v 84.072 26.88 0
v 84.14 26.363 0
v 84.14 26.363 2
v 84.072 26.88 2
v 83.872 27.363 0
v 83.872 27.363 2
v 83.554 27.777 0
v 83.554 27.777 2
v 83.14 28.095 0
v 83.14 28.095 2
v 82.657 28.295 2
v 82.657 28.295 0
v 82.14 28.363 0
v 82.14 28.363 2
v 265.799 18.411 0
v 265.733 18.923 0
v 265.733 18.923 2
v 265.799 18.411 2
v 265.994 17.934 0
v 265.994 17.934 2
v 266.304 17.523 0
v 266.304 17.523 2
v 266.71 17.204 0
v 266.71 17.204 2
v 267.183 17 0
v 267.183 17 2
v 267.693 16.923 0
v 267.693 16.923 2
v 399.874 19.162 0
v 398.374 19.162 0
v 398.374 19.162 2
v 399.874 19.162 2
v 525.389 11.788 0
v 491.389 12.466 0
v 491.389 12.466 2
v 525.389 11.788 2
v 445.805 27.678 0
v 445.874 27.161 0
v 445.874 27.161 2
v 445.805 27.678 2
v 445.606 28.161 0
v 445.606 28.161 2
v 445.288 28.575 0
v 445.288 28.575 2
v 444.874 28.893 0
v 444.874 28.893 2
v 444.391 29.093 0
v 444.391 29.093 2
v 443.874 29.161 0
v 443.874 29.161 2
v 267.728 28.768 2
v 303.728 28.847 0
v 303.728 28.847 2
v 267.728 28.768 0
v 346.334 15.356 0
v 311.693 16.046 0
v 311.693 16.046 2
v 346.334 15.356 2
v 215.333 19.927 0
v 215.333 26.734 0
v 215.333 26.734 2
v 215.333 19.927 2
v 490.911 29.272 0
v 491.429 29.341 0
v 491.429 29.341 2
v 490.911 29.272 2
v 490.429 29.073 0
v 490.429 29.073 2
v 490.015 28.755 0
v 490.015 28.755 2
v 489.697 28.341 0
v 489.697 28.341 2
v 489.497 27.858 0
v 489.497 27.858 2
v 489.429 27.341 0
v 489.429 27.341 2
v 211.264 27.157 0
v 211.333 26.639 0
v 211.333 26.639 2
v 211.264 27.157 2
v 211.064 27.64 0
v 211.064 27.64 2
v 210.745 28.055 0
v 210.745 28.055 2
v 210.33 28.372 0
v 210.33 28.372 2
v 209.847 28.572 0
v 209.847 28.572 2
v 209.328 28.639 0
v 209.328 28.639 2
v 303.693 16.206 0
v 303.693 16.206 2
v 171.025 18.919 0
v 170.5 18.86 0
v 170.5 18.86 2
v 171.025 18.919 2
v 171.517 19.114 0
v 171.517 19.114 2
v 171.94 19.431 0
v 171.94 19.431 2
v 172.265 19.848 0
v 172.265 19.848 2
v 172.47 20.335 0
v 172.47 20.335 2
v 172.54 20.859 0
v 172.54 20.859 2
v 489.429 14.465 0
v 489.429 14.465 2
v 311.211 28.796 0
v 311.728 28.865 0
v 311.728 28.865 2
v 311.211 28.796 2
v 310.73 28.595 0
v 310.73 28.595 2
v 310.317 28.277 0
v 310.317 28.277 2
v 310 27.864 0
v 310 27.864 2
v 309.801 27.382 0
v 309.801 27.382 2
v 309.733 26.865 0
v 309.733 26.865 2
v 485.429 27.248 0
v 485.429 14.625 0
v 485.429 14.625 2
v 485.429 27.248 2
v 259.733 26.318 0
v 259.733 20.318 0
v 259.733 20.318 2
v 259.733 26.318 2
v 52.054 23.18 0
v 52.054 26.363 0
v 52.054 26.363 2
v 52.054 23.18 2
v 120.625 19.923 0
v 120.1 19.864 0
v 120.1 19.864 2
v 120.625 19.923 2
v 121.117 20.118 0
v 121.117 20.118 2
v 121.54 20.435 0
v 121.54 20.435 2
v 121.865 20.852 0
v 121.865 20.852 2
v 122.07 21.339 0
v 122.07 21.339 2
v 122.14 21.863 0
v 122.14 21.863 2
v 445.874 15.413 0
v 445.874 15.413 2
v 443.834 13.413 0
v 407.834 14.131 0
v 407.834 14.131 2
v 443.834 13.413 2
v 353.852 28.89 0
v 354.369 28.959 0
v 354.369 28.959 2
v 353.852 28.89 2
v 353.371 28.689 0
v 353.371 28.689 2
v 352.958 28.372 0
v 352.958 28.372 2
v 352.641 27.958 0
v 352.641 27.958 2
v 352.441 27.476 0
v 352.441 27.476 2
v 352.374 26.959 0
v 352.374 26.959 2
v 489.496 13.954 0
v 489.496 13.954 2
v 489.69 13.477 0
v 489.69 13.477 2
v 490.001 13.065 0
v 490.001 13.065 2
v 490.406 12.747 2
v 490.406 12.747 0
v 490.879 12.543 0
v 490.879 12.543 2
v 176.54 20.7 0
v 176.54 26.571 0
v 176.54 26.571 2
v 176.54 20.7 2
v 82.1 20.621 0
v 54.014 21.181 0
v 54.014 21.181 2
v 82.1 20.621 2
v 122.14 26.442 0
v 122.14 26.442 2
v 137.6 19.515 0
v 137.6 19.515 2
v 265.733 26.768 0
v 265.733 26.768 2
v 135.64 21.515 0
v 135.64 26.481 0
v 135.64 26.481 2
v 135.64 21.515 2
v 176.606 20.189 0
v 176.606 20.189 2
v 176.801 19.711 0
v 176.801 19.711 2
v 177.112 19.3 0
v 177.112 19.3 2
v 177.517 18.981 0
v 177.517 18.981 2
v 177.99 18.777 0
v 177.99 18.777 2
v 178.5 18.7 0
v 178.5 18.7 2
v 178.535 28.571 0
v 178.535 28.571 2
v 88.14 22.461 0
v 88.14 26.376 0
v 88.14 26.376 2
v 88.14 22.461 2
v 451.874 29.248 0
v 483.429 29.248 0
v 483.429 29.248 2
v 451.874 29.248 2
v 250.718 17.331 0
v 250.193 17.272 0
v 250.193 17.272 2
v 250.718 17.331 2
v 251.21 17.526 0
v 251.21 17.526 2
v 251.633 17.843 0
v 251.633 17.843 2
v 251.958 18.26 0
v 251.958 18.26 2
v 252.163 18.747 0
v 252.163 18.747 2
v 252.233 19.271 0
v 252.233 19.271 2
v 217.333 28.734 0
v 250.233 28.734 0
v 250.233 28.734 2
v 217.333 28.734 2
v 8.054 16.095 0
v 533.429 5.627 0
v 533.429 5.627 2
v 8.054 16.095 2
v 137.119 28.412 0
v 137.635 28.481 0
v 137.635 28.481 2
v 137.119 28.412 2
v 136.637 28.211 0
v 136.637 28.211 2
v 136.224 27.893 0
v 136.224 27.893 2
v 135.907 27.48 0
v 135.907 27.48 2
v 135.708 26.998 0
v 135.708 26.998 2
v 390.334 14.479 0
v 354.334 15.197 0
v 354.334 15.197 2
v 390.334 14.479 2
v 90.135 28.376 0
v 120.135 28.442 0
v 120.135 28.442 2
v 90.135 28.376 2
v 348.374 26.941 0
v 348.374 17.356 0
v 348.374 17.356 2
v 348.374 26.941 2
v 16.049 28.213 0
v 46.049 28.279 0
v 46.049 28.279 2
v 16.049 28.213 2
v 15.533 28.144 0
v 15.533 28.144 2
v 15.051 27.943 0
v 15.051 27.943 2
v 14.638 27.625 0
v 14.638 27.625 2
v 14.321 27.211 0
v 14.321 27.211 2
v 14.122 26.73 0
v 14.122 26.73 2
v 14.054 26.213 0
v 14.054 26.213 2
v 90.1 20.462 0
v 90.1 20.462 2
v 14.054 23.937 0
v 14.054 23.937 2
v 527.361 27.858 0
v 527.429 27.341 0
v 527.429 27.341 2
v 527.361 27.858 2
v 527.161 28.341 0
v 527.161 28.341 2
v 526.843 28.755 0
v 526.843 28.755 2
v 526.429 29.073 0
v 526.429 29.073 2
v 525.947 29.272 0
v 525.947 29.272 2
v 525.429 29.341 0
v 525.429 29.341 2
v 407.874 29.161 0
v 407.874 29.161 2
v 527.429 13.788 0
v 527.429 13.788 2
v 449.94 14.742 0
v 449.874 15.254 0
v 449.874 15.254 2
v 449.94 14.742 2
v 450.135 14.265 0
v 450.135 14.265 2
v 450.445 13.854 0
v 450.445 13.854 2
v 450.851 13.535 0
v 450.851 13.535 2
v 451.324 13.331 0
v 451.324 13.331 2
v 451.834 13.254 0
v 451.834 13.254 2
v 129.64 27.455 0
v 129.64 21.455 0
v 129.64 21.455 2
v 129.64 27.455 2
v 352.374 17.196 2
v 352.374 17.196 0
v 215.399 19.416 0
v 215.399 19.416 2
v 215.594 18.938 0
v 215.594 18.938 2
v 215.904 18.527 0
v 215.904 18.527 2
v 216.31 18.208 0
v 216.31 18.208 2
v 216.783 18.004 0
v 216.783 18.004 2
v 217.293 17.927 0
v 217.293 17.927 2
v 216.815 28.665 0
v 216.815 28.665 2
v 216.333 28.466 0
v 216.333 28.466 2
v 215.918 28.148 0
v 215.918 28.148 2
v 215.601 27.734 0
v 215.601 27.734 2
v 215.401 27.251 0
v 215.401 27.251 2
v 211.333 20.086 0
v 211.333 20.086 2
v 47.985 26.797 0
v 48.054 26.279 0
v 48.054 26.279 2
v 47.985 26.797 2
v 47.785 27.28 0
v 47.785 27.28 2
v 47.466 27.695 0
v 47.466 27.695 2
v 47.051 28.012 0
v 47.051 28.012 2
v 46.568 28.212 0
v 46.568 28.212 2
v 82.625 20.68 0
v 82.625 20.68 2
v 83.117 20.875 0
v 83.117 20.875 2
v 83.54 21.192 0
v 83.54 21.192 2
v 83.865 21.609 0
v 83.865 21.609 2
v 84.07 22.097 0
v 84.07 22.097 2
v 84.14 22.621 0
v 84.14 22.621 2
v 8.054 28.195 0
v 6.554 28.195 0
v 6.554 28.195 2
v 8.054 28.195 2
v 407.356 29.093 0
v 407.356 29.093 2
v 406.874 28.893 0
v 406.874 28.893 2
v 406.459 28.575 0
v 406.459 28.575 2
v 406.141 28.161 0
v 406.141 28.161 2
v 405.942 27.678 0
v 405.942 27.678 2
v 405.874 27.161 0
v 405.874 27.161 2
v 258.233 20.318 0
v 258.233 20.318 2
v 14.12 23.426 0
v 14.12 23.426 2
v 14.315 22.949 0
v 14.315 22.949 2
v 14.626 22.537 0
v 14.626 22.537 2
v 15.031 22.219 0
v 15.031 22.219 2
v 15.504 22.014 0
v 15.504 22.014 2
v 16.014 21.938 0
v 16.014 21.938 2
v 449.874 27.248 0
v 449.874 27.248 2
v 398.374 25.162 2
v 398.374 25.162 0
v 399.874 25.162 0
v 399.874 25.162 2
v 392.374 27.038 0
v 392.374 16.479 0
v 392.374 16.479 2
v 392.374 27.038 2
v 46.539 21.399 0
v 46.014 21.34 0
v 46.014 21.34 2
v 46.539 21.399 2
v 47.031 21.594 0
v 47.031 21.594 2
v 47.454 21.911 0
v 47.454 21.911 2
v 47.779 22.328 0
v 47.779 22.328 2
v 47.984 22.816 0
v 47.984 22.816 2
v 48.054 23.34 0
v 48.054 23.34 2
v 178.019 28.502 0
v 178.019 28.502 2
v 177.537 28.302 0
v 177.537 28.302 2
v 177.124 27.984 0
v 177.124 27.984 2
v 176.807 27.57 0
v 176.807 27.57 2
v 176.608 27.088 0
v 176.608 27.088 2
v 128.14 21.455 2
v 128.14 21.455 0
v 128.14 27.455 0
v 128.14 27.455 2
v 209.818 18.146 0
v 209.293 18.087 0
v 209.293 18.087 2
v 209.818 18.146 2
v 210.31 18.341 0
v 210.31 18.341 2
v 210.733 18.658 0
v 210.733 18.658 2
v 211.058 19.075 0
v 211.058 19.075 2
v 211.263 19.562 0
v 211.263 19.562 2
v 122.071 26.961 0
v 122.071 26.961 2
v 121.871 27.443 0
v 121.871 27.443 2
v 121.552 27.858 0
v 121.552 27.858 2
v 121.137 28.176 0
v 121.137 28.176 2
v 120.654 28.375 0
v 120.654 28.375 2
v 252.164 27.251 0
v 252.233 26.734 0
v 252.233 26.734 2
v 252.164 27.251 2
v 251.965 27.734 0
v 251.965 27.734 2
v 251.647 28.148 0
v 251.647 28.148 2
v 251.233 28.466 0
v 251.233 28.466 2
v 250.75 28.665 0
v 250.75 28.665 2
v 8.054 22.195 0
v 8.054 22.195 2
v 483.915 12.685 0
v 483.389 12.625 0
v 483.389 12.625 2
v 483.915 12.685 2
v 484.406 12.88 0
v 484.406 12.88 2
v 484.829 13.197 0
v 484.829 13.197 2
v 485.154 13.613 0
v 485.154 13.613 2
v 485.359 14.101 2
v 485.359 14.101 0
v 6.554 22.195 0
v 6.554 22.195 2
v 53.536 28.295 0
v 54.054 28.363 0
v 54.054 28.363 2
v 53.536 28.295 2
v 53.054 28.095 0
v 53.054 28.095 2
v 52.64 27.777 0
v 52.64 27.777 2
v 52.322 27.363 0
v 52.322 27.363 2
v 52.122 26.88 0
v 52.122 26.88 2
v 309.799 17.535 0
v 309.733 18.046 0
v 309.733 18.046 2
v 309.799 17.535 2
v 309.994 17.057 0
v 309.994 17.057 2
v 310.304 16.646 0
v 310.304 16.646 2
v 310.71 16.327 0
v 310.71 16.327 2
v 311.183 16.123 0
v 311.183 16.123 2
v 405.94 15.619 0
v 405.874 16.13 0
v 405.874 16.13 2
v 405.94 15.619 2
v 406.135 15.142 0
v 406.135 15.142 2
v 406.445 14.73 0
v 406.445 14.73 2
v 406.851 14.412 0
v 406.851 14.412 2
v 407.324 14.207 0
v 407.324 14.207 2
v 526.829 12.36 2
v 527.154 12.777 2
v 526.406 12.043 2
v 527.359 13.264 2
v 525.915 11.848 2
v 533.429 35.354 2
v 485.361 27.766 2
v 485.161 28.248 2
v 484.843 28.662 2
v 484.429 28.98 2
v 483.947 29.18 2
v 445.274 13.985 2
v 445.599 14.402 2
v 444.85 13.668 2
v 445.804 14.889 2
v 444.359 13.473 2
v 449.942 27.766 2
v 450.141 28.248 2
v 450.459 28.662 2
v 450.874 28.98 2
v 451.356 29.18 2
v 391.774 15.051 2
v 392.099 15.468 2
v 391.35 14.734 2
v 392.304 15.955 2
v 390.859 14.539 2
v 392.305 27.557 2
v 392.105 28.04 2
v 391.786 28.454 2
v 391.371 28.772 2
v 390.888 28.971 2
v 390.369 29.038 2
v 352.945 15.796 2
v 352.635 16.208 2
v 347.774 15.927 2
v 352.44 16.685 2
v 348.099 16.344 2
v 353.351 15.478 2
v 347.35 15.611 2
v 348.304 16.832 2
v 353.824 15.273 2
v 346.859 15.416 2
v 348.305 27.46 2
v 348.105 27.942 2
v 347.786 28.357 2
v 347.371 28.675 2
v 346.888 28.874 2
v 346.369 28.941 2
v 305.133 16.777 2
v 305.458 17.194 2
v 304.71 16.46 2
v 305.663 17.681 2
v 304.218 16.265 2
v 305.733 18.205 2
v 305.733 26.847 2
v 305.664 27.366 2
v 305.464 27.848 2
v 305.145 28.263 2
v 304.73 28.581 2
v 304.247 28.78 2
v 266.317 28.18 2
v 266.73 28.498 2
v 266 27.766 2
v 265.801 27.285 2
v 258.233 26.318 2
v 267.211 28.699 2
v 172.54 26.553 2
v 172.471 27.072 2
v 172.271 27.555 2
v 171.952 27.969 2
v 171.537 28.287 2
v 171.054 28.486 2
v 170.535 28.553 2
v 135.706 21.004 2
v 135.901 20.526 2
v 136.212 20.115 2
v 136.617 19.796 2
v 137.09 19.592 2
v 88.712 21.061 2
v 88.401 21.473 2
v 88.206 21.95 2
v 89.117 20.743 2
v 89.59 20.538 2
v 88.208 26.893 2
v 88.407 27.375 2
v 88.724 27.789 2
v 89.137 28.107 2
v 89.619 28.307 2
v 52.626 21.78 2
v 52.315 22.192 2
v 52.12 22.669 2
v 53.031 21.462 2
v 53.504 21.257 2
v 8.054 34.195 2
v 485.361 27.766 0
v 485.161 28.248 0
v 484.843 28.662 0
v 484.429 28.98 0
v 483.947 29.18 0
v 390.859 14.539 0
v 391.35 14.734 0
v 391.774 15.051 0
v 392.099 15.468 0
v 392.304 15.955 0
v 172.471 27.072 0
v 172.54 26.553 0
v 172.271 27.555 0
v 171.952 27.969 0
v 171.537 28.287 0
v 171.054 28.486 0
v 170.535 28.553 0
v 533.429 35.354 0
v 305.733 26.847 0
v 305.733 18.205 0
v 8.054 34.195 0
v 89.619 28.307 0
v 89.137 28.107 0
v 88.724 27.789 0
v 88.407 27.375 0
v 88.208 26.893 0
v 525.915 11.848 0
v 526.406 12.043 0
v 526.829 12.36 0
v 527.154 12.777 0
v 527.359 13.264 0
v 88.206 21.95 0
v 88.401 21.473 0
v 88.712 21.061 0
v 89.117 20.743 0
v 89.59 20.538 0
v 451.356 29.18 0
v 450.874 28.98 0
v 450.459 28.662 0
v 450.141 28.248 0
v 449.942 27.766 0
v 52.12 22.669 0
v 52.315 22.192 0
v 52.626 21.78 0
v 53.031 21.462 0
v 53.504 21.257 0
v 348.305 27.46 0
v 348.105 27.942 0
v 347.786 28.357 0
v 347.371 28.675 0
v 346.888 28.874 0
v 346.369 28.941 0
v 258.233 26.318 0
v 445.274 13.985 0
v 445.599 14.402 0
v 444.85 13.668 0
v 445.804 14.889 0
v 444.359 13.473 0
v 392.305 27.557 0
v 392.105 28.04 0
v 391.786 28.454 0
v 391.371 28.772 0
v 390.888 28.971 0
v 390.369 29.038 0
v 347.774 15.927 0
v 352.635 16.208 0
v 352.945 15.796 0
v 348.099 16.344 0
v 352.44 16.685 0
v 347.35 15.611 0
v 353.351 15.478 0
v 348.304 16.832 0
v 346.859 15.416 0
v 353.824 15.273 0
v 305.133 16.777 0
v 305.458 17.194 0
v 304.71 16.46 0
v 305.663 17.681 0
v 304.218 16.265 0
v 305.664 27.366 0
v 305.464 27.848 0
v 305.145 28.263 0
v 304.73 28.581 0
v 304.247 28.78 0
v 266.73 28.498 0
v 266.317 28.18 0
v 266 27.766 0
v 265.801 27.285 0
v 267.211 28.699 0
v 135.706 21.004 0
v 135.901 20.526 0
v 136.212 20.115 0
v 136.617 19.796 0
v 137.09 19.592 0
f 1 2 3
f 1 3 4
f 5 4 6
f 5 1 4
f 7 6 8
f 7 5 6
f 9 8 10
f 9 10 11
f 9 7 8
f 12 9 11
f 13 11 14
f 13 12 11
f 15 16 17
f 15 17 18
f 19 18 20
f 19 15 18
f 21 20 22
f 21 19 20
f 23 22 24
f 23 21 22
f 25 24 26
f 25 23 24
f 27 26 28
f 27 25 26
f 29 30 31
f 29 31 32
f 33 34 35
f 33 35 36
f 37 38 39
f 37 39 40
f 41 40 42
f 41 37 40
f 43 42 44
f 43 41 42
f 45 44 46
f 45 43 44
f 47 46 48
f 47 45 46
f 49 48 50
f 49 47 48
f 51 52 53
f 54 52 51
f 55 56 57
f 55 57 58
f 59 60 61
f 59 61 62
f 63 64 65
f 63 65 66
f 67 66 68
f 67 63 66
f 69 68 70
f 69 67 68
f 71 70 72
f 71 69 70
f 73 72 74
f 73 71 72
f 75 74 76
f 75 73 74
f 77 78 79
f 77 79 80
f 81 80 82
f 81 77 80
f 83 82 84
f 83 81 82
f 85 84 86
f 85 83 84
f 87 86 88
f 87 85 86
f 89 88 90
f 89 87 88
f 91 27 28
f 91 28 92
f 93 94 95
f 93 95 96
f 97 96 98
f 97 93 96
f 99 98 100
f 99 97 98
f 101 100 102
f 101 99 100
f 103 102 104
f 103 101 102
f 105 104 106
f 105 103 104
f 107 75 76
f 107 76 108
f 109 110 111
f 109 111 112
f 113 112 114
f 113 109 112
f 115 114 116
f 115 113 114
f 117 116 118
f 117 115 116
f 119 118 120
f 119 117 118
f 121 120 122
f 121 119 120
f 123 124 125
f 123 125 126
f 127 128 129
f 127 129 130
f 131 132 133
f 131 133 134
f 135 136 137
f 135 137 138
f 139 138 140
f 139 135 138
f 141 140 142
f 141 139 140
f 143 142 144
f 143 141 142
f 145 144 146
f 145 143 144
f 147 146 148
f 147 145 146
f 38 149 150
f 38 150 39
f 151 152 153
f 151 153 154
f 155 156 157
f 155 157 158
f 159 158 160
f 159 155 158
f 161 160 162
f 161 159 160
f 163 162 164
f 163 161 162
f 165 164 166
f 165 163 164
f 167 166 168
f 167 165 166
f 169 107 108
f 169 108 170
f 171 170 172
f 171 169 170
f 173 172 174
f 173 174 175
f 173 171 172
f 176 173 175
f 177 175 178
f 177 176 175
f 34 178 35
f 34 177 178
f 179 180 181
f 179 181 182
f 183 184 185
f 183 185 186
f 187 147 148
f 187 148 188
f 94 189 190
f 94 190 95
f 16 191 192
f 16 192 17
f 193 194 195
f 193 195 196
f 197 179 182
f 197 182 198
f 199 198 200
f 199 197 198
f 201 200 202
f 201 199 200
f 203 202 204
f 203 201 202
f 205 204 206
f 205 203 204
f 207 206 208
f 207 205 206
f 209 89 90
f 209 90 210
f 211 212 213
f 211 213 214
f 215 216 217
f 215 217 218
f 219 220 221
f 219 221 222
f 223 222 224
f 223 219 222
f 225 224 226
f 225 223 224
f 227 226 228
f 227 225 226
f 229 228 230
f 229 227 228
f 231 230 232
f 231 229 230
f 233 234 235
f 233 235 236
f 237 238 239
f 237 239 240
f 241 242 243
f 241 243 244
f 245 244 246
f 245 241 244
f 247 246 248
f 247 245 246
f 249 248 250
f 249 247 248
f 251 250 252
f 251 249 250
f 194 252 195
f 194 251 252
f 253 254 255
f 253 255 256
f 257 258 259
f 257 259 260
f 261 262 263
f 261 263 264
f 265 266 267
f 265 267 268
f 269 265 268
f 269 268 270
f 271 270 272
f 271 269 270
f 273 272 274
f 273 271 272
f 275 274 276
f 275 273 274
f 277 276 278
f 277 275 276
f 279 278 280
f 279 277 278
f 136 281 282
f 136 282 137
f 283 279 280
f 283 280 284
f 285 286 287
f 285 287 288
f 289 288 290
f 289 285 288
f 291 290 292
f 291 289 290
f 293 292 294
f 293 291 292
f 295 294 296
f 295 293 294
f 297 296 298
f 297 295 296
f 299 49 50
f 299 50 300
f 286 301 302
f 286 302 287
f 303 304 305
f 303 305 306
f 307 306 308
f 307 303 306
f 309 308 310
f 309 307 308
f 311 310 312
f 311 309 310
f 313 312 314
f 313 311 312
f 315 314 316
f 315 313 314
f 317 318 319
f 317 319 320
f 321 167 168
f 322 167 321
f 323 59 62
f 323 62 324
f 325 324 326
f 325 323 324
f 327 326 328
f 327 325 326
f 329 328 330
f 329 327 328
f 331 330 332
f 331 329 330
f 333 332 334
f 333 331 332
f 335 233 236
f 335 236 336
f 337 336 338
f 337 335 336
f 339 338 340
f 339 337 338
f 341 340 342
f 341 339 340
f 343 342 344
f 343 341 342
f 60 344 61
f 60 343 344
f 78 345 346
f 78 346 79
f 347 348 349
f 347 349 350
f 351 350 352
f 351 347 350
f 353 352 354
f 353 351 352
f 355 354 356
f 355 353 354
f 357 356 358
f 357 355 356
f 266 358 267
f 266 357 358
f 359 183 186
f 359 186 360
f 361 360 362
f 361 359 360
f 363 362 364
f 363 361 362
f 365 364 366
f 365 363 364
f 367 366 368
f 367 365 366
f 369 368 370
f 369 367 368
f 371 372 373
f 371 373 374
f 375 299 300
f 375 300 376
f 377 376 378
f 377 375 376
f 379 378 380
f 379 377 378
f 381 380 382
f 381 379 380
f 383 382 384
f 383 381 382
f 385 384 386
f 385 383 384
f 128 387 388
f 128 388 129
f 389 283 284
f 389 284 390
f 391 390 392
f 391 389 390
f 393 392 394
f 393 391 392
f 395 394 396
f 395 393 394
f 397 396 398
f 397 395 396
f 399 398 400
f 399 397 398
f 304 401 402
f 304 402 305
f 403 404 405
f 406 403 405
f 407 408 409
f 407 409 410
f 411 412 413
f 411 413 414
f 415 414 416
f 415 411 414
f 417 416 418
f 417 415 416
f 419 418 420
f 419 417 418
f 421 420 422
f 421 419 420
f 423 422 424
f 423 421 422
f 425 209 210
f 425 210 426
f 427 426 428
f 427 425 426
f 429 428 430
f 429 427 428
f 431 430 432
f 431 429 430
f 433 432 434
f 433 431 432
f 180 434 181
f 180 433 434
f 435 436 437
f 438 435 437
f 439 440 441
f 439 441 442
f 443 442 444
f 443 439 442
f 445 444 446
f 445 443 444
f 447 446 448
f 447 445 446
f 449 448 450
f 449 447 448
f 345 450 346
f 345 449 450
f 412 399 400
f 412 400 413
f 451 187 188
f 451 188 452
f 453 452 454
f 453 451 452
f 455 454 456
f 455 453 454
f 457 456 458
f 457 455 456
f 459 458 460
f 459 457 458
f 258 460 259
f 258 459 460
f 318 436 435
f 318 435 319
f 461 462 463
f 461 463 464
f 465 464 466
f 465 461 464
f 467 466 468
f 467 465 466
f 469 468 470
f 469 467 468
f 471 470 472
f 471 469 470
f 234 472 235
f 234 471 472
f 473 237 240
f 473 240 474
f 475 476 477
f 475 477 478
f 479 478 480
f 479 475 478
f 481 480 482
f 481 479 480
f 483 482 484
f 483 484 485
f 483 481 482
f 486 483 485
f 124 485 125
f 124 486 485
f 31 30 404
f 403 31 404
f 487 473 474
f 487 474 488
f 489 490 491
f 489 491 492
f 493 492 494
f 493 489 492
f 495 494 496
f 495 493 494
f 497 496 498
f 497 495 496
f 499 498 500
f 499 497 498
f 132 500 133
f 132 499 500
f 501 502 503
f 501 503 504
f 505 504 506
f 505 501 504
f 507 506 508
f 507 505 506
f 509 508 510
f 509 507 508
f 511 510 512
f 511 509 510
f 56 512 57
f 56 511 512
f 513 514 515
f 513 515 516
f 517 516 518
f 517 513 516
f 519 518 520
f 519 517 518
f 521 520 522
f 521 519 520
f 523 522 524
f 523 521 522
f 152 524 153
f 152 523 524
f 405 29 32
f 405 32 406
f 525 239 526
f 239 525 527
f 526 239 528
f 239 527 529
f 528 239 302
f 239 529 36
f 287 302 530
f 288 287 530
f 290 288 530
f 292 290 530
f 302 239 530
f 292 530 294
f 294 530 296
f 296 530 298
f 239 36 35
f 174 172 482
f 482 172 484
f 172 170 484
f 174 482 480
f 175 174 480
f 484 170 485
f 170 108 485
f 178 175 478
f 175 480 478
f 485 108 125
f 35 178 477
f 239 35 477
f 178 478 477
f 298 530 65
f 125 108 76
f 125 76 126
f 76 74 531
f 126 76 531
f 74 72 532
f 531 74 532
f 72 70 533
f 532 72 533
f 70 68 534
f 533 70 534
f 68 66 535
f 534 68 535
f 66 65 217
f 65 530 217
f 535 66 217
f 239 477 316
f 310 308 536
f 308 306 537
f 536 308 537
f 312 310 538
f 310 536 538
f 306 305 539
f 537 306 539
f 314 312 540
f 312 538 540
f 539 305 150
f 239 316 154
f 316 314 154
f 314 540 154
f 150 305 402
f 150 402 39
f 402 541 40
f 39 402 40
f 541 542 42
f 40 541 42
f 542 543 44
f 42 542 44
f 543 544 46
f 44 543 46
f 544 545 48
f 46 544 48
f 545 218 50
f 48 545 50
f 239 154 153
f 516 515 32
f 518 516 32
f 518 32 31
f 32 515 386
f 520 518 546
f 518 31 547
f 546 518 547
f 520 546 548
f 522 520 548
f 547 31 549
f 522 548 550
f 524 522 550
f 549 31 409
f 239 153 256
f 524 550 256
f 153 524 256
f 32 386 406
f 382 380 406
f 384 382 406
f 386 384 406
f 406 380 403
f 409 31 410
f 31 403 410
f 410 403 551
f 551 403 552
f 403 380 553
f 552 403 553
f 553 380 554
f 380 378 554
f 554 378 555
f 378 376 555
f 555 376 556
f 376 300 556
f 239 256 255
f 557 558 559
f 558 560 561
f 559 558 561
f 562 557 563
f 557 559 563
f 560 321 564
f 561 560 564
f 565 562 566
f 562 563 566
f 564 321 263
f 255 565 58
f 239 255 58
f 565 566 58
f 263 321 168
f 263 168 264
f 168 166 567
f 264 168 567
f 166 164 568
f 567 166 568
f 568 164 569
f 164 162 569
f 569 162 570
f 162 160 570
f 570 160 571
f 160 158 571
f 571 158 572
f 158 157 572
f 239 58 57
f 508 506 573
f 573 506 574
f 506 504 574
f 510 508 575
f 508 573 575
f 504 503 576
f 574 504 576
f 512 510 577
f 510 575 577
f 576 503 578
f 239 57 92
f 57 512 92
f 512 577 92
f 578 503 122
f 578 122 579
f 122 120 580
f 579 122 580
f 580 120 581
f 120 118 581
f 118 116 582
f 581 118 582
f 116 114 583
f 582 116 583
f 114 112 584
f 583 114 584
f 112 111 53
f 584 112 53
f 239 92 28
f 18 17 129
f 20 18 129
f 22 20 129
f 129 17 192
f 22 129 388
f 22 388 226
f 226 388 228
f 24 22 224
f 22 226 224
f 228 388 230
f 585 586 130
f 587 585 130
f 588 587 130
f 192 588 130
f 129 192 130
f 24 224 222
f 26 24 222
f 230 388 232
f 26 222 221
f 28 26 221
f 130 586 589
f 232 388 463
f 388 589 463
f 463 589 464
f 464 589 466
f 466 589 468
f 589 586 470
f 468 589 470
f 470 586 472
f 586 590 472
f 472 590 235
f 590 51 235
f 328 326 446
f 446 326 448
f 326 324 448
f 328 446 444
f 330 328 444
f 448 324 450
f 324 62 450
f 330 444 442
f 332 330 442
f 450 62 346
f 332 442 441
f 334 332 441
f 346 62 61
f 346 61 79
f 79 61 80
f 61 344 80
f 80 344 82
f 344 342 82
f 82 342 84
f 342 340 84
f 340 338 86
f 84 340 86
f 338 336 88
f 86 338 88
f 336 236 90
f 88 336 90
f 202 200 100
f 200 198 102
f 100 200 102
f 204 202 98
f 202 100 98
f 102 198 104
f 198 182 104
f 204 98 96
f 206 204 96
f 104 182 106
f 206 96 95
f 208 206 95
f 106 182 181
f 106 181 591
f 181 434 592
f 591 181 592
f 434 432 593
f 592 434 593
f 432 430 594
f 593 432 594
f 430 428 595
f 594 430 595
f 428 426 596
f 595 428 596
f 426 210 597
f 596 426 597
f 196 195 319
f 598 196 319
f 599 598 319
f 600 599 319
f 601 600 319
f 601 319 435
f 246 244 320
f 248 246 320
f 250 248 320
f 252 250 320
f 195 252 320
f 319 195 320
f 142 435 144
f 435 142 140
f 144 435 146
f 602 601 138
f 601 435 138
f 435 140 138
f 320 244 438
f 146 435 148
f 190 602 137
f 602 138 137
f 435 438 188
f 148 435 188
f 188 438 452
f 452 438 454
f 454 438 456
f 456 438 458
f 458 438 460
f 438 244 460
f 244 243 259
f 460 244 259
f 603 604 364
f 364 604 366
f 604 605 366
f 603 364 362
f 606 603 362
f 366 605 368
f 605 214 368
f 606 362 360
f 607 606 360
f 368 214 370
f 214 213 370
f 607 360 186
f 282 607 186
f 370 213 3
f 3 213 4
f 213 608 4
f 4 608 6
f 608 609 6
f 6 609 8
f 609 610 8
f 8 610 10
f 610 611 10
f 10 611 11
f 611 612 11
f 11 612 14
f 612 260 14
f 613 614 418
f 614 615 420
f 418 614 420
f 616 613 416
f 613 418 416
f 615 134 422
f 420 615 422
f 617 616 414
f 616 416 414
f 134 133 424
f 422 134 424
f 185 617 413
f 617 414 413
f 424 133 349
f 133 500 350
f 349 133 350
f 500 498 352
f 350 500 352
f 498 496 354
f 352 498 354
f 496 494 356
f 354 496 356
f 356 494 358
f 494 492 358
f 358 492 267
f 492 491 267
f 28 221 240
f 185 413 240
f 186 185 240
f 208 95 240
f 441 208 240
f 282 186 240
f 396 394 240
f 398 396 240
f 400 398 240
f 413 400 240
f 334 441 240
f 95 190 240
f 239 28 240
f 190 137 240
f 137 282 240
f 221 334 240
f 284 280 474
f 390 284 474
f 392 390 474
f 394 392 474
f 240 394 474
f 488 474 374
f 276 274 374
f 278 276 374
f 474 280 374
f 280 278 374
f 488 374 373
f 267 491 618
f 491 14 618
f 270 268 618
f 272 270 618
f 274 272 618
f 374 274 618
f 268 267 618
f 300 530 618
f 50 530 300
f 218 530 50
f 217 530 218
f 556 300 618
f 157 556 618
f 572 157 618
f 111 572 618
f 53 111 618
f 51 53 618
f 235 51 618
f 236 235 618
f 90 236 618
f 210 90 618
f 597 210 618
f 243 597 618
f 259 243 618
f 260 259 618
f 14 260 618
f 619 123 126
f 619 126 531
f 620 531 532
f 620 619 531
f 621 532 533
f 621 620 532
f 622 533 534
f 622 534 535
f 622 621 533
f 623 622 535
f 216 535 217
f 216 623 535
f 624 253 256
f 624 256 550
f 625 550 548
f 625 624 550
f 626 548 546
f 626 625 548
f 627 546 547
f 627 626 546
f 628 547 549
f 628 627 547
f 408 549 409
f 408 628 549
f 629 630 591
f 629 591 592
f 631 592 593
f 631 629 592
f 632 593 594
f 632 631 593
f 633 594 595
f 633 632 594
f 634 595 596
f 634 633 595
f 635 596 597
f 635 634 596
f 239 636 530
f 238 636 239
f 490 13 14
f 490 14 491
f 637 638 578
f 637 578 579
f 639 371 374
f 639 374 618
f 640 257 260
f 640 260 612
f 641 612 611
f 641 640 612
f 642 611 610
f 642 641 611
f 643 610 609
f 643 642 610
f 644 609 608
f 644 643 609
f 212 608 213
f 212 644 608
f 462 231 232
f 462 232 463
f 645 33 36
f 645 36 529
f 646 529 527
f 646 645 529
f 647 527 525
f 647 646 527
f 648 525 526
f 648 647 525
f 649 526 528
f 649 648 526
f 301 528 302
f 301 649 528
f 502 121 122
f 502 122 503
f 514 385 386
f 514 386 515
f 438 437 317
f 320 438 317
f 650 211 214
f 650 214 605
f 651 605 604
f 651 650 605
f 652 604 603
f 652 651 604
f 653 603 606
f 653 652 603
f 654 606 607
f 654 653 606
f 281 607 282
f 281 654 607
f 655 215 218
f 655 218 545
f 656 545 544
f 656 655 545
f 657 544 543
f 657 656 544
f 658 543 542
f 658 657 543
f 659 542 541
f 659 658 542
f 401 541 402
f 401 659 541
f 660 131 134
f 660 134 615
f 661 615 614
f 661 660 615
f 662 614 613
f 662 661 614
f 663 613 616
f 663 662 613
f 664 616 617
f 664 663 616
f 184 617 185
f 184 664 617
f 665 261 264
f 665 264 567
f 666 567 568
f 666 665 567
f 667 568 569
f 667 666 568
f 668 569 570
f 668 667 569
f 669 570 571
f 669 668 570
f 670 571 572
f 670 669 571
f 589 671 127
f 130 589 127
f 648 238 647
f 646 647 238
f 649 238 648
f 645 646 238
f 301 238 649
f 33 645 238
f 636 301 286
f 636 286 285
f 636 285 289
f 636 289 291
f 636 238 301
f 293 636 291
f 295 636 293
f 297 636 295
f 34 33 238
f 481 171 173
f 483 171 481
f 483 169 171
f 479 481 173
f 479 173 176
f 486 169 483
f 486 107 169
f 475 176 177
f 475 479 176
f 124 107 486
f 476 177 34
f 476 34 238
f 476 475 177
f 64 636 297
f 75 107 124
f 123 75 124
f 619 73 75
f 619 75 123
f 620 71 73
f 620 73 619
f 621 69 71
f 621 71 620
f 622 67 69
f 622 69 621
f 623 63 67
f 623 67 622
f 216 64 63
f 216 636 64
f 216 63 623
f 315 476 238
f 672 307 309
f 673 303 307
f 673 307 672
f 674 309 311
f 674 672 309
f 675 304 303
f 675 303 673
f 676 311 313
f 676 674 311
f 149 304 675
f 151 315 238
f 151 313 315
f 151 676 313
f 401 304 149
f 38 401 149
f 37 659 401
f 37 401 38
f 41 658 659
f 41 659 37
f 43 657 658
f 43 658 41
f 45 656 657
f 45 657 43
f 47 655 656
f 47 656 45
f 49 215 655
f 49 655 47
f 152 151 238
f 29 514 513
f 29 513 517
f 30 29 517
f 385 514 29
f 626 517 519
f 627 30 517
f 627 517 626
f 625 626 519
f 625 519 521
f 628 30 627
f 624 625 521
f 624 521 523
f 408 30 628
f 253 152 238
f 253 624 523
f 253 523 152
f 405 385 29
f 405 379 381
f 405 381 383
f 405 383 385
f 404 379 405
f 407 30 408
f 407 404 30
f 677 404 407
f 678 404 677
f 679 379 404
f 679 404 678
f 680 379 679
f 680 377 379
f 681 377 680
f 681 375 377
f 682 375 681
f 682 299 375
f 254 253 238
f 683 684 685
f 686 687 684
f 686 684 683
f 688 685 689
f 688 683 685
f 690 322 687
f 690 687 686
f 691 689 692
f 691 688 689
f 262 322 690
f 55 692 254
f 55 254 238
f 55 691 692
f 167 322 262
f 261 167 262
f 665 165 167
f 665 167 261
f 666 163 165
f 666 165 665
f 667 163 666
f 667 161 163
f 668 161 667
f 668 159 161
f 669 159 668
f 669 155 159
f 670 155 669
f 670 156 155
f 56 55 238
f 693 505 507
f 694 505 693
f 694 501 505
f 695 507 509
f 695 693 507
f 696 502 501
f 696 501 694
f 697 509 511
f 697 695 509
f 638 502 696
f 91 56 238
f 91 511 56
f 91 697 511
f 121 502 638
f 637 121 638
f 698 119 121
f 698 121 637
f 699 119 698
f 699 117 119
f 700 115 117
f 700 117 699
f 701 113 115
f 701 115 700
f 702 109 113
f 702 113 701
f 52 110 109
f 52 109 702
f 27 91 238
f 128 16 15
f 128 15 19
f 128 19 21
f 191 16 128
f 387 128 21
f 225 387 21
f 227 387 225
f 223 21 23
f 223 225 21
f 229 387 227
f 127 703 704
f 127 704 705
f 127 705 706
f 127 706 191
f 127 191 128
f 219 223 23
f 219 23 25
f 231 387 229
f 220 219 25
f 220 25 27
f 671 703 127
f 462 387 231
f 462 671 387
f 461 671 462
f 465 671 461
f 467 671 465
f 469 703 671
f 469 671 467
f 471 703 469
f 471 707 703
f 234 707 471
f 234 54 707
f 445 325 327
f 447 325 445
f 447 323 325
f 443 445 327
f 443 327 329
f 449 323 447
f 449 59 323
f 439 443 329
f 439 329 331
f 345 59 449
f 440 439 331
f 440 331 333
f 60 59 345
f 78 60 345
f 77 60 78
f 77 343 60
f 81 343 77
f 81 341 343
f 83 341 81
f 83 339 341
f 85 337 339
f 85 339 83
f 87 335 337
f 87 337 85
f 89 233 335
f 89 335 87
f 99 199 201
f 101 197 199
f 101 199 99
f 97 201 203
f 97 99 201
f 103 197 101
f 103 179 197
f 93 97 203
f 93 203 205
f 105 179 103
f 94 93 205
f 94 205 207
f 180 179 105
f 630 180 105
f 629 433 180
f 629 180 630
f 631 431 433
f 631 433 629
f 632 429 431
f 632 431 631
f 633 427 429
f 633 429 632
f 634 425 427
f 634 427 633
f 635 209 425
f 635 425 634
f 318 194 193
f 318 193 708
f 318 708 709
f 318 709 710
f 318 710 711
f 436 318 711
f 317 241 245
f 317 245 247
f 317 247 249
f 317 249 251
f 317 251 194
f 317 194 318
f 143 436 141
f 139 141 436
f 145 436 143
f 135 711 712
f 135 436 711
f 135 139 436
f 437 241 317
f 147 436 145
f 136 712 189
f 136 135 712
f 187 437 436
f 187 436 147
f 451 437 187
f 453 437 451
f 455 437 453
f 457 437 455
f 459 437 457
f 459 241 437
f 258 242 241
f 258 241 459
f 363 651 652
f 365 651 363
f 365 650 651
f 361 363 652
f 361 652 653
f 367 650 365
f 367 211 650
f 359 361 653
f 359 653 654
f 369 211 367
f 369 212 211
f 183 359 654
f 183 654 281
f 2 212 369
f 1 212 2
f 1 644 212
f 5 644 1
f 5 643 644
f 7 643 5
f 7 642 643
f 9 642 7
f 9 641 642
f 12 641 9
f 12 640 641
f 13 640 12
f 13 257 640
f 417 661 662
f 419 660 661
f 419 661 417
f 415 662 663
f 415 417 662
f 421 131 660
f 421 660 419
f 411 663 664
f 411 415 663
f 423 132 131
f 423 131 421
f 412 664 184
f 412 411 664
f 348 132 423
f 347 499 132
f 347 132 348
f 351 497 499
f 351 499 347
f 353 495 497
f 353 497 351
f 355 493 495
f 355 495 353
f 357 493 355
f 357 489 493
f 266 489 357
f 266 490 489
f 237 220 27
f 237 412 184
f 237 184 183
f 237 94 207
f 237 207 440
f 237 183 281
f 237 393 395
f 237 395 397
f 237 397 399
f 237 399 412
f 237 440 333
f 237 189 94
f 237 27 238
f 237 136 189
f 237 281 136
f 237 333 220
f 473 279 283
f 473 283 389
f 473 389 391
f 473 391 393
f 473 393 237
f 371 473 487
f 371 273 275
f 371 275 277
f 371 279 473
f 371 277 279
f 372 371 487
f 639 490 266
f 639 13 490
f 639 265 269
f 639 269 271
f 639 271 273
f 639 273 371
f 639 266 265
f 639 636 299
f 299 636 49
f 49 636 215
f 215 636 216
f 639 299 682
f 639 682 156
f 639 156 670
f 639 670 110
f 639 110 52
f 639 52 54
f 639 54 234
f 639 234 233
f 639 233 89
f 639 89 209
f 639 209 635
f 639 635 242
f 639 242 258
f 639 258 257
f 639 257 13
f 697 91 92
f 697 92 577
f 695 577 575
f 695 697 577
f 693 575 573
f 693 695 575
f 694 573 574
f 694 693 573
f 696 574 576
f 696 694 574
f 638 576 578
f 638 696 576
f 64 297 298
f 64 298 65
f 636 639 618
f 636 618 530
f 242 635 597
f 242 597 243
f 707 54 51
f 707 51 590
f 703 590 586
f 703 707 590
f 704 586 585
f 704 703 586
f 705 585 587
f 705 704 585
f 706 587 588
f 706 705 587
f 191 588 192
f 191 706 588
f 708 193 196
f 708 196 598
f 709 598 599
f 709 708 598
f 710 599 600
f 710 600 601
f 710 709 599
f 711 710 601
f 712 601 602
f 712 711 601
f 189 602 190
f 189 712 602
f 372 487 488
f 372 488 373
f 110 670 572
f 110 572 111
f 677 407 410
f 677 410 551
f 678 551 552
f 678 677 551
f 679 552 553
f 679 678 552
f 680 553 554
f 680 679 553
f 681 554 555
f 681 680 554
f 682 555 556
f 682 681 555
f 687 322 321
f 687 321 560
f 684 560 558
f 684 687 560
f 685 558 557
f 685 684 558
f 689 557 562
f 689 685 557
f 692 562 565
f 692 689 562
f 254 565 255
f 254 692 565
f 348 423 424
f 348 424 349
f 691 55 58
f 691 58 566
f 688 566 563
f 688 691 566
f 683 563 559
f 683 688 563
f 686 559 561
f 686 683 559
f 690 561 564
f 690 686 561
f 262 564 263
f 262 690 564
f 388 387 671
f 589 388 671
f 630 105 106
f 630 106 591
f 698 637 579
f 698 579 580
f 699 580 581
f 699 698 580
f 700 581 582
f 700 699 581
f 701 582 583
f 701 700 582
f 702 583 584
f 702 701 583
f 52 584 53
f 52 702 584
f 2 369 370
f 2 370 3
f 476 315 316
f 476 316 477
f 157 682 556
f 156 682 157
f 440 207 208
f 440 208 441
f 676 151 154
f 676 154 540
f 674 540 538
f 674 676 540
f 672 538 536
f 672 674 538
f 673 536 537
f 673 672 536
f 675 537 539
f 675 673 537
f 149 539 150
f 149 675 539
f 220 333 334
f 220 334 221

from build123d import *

# Parameters (mm, degrees)
SKETCH_2_W      = 1.5
SKETCH_2_H      = 6
EXTRUDE_2_DEPTH = 2


with BuildPart() as part:
    # 草图2 → 凸台-拉伸2 (new body)
    with BuildSketch(Plane.XY):
        Polygon((8.053783248, 22.194978349), (6.553783248, 22.194978349), (6.553783248, 28.194978349), (8.053783248, 28.194978349), (8.053783248, 34.194978349), (533.429113931, 35.353824286), (533.429113931, 5.627058882), (8.053783248, 16.095153128), align=None)
        with Locations((128.889742021, 24.455033291)):
            Rectangle(SKETCH_2_W, SKETCH_2_H, mode=Mode.SUBTRACT)
        with Locations((258.982626832, 23.318434437)):
            Rectangle(SKETCH_2_W, SKETCH_2_H, mode=Mode.SUBTRACT)
        with Locations((399.123508139, 22.161638966)):
            Rectangle(SKETCH_2_W, SKETCH_2_H, mode=Mode.SUBTRACT)
        with BuildLine():
            Line((14.053783248, 26.212604877), (14.053783248, 23.93734113))
            ThreePointArc((14.053783248, 23.93734113), (14.625552855, 22.537284723), (16.013941191, 21.937738017))
            Line((16.013941191, 21.937738017), (46.013941191, 21.339988544))
            ThreePointArc((46.013941191, 21.339988544), (47.453839655, 21.911361263), (48.053783248, 23.339591657))
            Line((48.053783248, 23.339591657), (48.053783248, 26.278777337))
            ThreePointArc((48.053783248, 26.278777337), (47.466436254, 27.694549736), (46.049371762, 28.278772471))
            Line((46.049371762, 28.278772471), (16.049371762, 28.212600011))
            ThreePointArc((16.049371762, 28.212600011), (14.638010849, 27.625257882), (14.053783248, 26.212604877))
        make_face(mode=Mode.SUBTRACT)
        with BuildLine():
            Line((52.053783248, 26.362790255), (52.053783248, 23.180191797))
            ThreePointArc((52.053783248, 23.180191797), (52.625552855, 21.78013539), (54.013941191, 21.180588684))
            Line((54.013941191, 21.180588684), (82.099899964, 20.620976448))
            ThreePointArc((82.099899964, 20.620976448), (83.539798428, 21.192349168), (84.139742021, 22.620579561))
            Line((84.139742021, 22.620579561), (84.139742021, 26.362790255))
            ThreePointArc((84.139742021, 26.362790255), (83.553955584, 27.777003817), (82.139742021, 28.362790255))
            Line((82.139742021, 28.362790255), (54.053783248, 28.362790255))
            ThreePointArc((54.053783248, 28.362790255), (52.639569686, 27.777003817), (52.053783248, 26.362790255))
        make_face(mode=Mode.SUBTRACT)
        with BuildLine():
            Line((88.139742021, 26.376019882), (88.139742021, 22.461179702))
            ThreePointArc((88.139742021, 22.461179702), (88.711511628, 21.061123295), (90.099899964, 20.461576589))
            Line((90.099899964, 20.461576589), (120.099899964, 19.863827115))
            ThreePointArc((120.099899964, 19.863827115), (121.539798428, 20.435199835), (122.139742021, 21.863430228))
            Line((122.139742021, 21.863430228), (122.139742021, 26.442192342))
            ThreePointArc((122.139742021, 26.442192342), (121.552395026, 27.857964741), (120.135330535, 28.442187476))
            Line((120.135330535, 28.442187476), (90.135330535, 28.376015016))
            ThreePointArc((90.135330535, 28.376015016), (88.723969622, 27.788672887), (88.139742021, 26.376019882))
        make_face(mode=Mode.SUBTRACT)
        with BuildLine():
            Line((135.639742021, 26.480792944), (135.639742021, 21.514743035))
            ThreePointArc((135.639742021, 21.514743035), (136.211511628, 20.114686628), (137.599899964, 19.515139922))
            Line((137.599899964, 19.515139922), (170.499899964, 18.859607999))
            ThreePointArc((170.499899964, 18.859607999), (171.939798428, 19.430980719), (172.539742021, 20.859211112))
            Line((172.539742021, 20.859211112), (172.539742021, 26.553362075))
            ThreePointArc((172.539742021, 26.553362075), (171.952395026, 27.969134474), (170.535330535, 28.553357209))
            Line((170.535330535, 28.553357209), (137.635330535, 28.480788078))
            ThreePointArc((137.635330535, 28.480788078), (136.223969622, 27.893445949), (135.639742021, 26.480792944))
        make_face(mode=Mode.SUBTRACT)
        with BuildLine():
            Line((176.539742021, 26.571008064), (176.539742021, 20.699811253))
            ThreePointArc((176.539742021, 20.699811253), (177.111511628, 19.299754846), (178.499899964, 18.70020814))
            Line((178.499899964, 18.70020814), (209.292784775, 18.08666045))
            ThreePointArc((209.292784775, 18.08666045), (210.732683239, 18.65803317), (211.332626832, 20.086263563))
            Line((211.332626832, 20.086263563), (211.332626832, 26.638929429))
            ThreePointArc((211.332626832, 26.638929429), (210.745279837, 28.054701828), (209.328215345, 28.638924564))
            Line((209.328215345, 28.638924564), (178.535330535, 28.571003199))
            ThreePointArc((178.535330535, 28.571003199), (177.123969622, 27.983661069), (176.539742021, 26.571008064))
        make_face(mode=Mode.SUBTRACT)
        with BuildLine():
            Line((215.332626832, 26.733560912), (215.332626832, 19.926863704))
            ThreePointArc((215.332626832, 19.926863704), (215.904396438, 18.526807297), (217.292784775, 17.92726059))
            Line((217.292784775, 17.92726059), (250.192784775, 17.271728668))
            ThreePointArc((250.192784775, 17.271728668), (251.632683239, 17.843101387), (252.232626832, 19.271331781))
            Line((252.232626832, 19.271331781), (252.232626832, 26.733560912))
            ThreePointArc((252.232626832, 26.733560912), (251.646840394, 28.147774475), (250.232626832, 28.733560912))
            Line((250.232626832, 28.733560912), (217.332626832, 28.733560912))
            ThreePointArc((217.332626832, 28.733560912), (215.918413269, 28.147774475), (215.332626832, 26.733560912))
        make_face(mode=Mode.SUBTRACT)
        with BuildLine():
            Line((265.732626832, 26.767745151), (265.732626832, 18.922644588))
            ThreePointArc((265.732626832, 18.922644588), (266.304396438, 17.522588181), (267.692784775, 16.923041475))
            Line((267.692784775, 16.923041475), (303.692784775, 16.205742106))
            ThreePointArc((303.692784775, 16.205742106), (305.132683239, 16.777114826), (305.732626832, 18.20534522))
            Line((305.732626832, 18.20534522), (305.732626832, 26.847152103))
            ThreePointArc((305.732626832, 26.847152103), (305.145279837, 28.262924503), (303.728215345, 28.847147238))
            Line((303.728215345, 28.847147238), (267.728215345, 28.767740286))
            ThreePointArc((267.728215345, 28.767740286), (266.316854432, 28.180398157), (265.732626832, 26.767745151))
        make_face(mode=Mode.SUBTRACT)
        with BuildLine():
            Line((309.732626832, 26.864798093), (309.732626832, 18.04594536))
            ThreePointArc((309.732626832, 18.04594536), (310.304396438, 16.645888953), (311.692784775, 16.046342247))
            Line((311.692784775, 16.046342247), (346.333666082, 15.356123294))
            ThreePointArc((346.333666082, 15.356123294), (347.773564547, 15.927496014), (348.373508139, 17.355726408))
            Line((348.373508139, 17.355726408), (348.373508139, 26.941207171))
            ThreePointArc((348.373508139, 26.941207171), (347.786161145, 28.35697957), (346.369096653, 28.941202305))
            Line((346.369096653, 28.941202305), (311.728215345, 28.864793227))
            ThreePointArc((311.728215345, 28.864793227), (310.316854432, 28.277451098), (309.732626832, 26.864798093))
        make_face(mode=Mode.SUBTRACT)
        with BuildLine():
            Line((352.373508139, 26.95885316), (352.373508139, 17.196326548))
            ThreePointArc((352.373508139, 17.196326548), (352.945277746, 15.796270141), (354.333666082, 15.196723435))
            Line((354.333666082, 15.196723435), (390.333666082, 14.479424066))
            ThreePointArc((390.333666082, 14.479424066), (391.773564547, 15.050796786), (392.373508139, 16.47902718))
            Line((392.373508139, 16.47902718), (392.373508139, 27.038260112))
            ThreePointArc((392.373508139, 27.038260112), (391.786161145, 28.454032511), (390.369096653, 29.038255247))
            Line((390.369096653, 29.038255247), (354.369096653, 28.958848295))
            ThreePointArc((354.369096653, 28.958848295), (352.95773574, 28.371506165), (352.373508139, 26.95885316))
        make_face(mode=Mode.SUBTRACT)
        with BuildLine():
            Line((405.873508139, 27.160684029), (405.873508139, 16.130339987))
            ThreePointArc((405.873508139, 16.130339987), (406.445277746, 14.73028358), (407.833666082, 14.130736874))
            Line((407.833666082, 14.130736874), (443.833666082, 13.413437505))
            ThreePointArc((443.833666082, 13.413437505), (445.273564547, 13.984810225), (445.873508139, 15.413040618))
            Line((445.873508139, 15.413040618), (445.873508139, 27.160684029))
            ThreePointArc((445.873508139, 27.160684029), (445.287721702, 28.574897591), (443.873508139, 29.160684029))
            Line((443.873508139, 29.160684029), (407.873508139, 29.160684029))
            ThreePointArc((407.873508139, 29.160684029), (406.459294577, 28.574897591), (405.873508139, 27.160684029))
        make_face(mode=Mode.SUBTRACT)
        with BuildLine():
            Line((449.873508139, 27.247933753), (449.873508139, 15.253640759))
            ThreePointArc((449.873508139, 15.253640759), (450.445277746, 13.853584352), (451.833666082, 13.254037646))
            Line((451.833666082, 13.254037646), (483.389271874, 12.625292754))
            ThreePointArc((483.389271874, 12.625292754), (484.829170338, 13.196665474), (485.429113931, 14.624895867))
            Line((485.429113931, 14.624895867), (485.429113931, 27.247933753))
            ThreePointArc((485.429113931, 27.247933753), (484.843327493, 28.662147316), (483.429113931, 29.247933753))
            Line((483.429113931, 29.247933753), (451.873508139, 29.247933753))
            ThreePointArc((451.873508139, 29.247933753), (450.459294577, 28.662147316), (449.873508139, 27.247933753))
        make_face(mode=Mode.SUBTRACT)
        with BuildLine():
            Line((489.429113931, 27.340575198), (489.429113931, 14.465496007))
            ThreePointArc((489.429113931, 14.465496007), (490.000883538, 13.0654396), (491.389271874, 12.465892894))
            Line((491.389271874, 12.465892894), (525.389271874, 11.788443491))
            ThreePointArc((525.389271874, 11.788443491), (526.829170338, 12.35981621), (527.429113931, 13.788046604))
            Line((527.429113931, 13.788046604), (527.429113931, 27.340575198))
            ThreePointArc((527.429113931, 27.340575198), (526.843327493, 28.75478876), (525.429113931, 29.340575198))
            Line((525.429113931, 29.340575198), (491.429113931, 29.340575198))
            ThreePointArc((491.429113931, 29.340575198), (490.014900369, 28.75478876), (489.429113931, 27.340575198))
        make_face(mode=Mode.SUBTRACT)
    extrude(amount=EXTRUDE_2_DEPTH)


solid = part.part
